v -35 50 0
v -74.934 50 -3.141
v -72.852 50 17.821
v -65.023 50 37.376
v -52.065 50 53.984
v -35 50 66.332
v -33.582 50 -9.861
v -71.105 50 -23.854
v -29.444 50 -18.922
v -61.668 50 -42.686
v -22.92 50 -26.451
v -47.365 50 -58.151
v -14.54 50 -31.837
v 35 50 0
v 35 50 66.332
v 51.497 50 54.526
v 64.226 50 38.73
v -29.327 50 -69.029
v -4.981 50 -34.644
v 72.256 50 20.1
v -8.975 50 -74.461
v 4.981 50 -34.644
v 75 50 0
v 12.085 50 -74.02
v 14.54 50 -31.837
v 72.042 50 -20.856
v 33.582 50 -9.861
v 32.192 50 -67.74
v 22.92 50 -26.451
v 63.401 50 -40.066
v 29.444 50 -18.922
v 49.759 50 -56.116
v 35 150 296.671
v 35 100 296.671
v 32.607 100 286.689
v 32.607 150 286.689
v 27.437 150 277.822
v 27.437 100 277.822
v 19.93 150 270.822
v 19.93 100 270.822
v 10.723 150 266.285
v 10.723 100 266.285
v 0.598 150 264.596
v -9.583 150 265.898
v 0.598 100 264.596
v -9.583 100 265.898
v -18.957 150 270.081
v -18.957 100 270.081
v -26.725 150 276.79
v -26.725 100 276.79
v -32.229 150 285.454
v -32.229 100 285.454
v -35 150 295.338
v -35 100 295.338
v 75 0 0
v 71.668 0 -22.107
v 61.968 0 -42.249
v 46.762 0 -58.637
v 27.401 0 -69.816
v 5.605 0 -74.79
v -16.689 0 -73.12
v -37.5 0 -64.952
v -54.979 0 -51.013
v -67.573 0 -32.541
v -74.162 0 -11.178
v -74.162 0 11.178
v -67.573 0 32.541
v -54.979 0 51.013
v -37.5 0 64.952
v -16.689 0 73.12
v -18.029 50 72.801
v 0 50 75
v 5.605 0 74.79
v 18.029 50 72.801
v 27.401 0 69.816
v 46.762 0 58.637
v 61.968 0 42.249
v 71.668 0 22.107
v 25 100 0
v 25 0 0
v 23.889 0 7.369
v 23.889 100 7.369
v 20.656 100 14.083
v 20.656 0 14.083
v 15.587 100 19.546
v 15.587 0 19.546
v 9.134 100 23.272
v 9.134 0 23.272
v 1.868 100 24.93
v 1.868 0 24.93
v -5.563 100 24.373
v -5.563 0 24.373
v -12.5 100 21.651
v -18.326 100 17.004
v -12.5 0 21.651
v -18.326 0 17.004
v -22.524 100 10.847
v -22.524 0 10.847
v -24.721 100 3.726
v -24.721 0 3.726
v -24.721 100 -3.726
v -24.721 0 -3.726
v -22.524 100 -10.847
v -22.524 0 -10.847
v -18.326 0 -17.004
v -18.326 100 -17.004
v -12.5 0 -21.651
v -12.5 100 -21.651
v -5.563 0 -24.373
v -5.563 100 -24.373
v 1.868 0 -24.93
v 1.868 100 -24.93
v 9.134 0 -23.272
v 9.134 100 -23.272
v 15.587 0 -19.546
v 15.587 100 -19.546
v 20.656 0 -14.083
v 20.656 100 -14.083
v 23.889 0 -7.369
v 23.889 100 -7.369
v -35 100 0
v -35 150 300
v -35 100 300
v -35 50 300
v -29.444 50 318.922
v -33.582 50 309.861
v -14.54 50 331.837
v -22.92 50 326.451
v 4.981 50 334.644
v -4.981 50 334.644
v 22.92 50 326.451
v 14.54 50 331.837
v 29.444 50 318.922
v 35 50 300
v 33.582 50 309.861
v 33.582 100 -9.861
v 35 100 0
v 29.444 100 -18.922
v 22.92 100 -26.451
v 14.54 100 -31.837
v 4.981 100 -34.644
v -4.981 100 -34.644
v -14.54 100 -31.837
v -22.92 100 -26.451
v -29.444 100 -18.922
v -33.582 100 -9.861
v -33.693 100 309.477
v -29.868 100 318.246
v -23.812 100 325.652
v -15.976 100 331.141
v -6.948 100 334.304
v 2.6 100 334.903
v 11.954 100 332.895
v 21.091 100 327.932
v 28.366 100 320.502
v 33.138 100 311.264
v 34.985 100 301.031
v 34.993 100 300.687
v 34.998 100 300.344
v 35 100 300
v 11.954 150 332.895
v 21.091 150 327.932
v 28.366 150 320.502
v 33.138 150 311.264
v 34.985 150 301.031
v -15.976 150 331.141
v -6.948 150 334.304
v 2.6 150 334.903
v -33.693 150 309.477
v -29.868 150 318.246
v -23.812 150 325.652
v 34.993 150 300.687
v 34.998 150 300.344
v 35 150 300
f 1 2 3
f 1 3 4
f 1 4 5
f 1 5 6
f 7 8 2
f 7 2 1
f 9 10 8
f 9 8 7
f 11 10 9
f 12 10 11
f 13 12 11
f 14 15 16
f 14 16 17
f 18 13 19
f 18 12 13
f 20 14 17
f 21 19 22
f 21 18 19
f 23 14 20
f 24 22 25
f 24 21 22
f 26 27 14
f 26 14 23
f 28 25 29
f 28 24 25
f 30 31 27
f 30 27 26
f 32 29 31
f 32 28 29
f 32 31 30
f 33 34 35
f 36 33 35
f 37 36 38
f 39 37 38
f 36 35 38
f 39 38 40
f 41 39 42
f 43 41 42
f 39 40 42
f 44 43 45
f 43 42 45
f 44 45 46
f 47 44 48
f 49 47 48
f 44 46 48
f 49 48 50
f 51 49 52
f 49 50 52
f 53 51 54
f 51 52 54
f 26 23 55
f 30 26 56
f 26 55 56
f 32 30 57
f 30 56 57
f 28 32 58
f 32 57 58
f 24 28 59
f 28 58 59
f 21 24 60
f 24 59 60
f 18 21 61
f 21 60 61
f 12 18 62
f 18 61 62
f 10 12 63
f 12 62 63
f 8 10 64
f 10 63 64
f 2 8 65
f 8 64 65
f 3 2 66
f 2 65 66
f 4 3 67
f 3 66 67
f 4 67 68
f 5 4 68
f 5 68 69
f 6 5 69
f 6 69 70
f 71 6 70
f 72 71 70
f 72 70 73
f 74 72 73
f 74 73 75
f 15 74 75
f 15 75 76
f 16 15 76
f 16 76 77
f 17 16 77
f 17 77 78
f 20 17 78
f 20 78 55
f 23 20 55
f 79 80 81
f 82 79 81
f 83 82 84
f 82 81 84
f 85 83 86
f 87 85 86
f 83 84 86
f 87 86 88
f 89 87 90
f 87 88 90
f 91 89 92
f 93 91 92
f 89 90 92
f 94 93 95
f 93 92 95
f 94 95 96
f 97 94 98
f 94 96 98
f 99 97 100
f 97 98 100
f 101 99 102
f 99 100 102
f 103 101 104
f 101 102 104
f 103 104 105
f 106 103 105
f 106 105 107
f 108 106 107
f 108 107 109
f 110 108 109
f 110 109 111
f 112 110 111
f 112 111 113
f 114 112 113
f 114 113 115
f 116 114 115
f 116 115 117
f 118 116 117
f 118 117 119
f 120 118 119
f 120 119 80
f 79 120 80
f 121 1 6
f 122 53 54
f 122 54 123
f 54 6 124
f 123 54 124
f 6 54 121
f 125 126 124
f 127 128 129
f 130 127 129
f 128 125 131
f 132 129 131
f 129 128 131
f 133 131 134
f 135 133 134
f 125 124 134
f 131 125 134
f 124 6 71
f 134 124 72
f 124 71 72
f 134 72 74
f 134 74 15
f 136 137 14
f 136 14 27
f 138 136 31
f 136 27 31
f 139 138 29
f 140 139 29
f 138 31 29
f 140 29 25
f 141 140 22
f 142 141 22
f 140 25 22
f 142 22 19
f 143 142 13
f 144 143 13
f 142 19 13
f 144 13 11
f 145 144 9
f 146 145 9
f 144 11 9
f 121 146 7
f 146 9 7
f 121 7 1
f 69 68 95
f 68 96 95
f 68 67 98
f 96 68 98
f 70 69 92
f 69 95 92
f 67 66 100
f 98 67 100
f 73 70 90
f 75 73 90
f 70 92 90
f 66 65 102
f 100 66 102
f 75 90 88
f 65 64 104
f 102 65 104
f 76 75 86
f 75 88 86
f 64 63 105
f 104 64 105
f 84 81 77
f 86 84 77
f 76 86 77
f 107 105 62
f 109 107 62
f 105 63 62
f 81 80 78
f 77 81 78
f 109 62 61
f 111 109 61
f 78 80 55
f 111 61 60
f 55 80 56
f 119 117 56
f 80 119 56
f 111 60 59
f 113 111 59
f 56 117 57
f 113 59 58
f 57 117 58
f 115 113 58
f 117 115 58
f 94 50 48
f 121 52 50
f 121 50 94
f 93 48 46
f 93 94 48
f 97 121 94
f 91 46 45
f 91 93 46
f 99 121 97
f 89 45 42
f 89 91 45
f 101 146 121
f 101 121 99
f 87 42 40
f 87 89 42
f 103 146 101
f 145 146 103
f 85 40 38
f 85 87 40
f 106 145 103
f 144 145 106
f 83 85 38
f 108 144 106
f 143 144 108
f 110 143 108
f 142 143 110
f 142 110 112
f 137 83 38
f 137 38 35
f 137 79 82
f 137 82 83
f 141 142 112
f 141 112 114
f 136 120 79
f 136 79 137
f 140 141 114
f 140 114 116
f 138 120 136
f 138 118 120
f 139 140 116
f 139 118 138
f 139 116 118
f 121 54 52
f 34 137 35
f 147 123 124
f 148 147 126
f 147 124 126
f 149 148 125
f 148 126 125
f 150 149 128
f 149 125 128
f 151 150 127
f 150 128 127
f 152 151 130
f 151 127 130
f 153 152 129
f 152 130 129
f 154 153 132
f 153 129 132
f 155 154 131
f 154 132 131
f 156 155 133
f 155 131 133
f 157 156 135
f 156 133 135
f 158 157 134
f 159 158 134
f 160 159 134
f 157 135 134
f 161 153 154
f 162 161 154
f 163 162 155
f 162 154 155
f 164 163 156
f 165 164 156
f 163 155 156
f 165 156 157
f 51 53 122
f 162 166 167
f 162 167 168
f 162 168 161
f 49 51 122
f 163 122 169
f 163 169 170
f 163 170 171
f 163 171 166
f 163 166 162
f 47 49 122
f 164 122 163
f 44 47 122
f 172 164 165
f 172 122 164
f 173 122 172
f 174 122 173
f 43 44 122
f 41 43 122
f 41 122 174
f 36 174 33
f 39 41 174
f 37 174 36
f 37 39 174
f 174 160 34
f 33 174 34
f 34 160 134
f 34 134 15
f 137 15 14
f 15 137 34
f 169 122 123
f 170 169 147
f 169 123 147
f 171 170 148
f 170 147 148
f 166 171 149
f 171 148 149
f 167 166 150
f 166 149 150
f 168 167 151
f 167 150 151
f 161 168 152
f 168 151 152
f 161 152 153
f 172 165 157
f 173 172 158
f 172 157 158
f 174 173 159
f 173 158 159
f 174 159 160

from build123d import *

# Parameters (mm, degrees)
SKETCH1_R           = 75
BOSS_EXTRUDE1_DEPTH = 50
BOSS_EXTRUDE2_DEPTH = 50
BOSS_EXTRUDE3_DEPTH = 50
SKETCH4_R           = 25
CUT_EXTRUDE1_DEPTH  = 151


with BuildPart() as part:
    # Sketch1 → Boss-Extrude1 (new body)
    with BuildSketch(Plane(origin=(0, 0, 0), x_dir=(1, 0, 0), z_dir=(0, 1, 0))):
        Circle(SKETCH1_R)
    extrude(amount=BOSS_EXTRUDE1_DEPTH)

    # Sketch2 → Boss-Extrude2 (add)
    with BuildSketch(Plane(origin=(0, 50, 0), x_dir=(1, 0, 0), z_dir=(0, 1, 0))):
        with BuildLine():
            Line((-35, 0), (-35, -300))
            ThreePointArc((-35, -300), (0, -335), (35, -300))
            Line((35, -300), (35, 0))
            ThreePointArc((35, 0), (0, 35), (-35, 0))
        make_face()
    extrude(amount=BOSS_EXTRUDE2_DEPTH)

    # Sketch3 → Boss-Extrude3 (add)
    with BuildSketch(Plane(origin=(0, 100, 0), x_dir=(1, 0, 0), z_dir=(0, 1, 0))):
        with BuildLine():
            ThreePointArc((11.953887913, -332.895357784), (28.366317111, -320.502488959), (34.9848173, -301.03080477))
            ThreePointArc((34.9848173, -301.03080477), (34.996204119, -300.515458289), (35, -300))
            Line((35, -300), (35, -296.670788492))
            ThreePointArc((35, -296.670788492), (0.598184033, -264.595673491), (-35, -295.33761939))
            Line((-35, -295.33761939), (-35, -300))
            ThreePointArc((-35, -300), (-20.082503866, -328.665188617), (11.953887913, -332.895357784))
        make_face()
    extrude(amount=BOSS_EXTRUDE3_DEPTH)

    # Sketch4 → Cut-Extrude1 (cut, through all)
    with BuildSketch(Plane.XZ):
        Circle(SKETCH4_R)
    extrude(amount=-CUT_EXTRUDE1_DEPTH, mode=Mode.SUBTRACT)


solid = part.part
